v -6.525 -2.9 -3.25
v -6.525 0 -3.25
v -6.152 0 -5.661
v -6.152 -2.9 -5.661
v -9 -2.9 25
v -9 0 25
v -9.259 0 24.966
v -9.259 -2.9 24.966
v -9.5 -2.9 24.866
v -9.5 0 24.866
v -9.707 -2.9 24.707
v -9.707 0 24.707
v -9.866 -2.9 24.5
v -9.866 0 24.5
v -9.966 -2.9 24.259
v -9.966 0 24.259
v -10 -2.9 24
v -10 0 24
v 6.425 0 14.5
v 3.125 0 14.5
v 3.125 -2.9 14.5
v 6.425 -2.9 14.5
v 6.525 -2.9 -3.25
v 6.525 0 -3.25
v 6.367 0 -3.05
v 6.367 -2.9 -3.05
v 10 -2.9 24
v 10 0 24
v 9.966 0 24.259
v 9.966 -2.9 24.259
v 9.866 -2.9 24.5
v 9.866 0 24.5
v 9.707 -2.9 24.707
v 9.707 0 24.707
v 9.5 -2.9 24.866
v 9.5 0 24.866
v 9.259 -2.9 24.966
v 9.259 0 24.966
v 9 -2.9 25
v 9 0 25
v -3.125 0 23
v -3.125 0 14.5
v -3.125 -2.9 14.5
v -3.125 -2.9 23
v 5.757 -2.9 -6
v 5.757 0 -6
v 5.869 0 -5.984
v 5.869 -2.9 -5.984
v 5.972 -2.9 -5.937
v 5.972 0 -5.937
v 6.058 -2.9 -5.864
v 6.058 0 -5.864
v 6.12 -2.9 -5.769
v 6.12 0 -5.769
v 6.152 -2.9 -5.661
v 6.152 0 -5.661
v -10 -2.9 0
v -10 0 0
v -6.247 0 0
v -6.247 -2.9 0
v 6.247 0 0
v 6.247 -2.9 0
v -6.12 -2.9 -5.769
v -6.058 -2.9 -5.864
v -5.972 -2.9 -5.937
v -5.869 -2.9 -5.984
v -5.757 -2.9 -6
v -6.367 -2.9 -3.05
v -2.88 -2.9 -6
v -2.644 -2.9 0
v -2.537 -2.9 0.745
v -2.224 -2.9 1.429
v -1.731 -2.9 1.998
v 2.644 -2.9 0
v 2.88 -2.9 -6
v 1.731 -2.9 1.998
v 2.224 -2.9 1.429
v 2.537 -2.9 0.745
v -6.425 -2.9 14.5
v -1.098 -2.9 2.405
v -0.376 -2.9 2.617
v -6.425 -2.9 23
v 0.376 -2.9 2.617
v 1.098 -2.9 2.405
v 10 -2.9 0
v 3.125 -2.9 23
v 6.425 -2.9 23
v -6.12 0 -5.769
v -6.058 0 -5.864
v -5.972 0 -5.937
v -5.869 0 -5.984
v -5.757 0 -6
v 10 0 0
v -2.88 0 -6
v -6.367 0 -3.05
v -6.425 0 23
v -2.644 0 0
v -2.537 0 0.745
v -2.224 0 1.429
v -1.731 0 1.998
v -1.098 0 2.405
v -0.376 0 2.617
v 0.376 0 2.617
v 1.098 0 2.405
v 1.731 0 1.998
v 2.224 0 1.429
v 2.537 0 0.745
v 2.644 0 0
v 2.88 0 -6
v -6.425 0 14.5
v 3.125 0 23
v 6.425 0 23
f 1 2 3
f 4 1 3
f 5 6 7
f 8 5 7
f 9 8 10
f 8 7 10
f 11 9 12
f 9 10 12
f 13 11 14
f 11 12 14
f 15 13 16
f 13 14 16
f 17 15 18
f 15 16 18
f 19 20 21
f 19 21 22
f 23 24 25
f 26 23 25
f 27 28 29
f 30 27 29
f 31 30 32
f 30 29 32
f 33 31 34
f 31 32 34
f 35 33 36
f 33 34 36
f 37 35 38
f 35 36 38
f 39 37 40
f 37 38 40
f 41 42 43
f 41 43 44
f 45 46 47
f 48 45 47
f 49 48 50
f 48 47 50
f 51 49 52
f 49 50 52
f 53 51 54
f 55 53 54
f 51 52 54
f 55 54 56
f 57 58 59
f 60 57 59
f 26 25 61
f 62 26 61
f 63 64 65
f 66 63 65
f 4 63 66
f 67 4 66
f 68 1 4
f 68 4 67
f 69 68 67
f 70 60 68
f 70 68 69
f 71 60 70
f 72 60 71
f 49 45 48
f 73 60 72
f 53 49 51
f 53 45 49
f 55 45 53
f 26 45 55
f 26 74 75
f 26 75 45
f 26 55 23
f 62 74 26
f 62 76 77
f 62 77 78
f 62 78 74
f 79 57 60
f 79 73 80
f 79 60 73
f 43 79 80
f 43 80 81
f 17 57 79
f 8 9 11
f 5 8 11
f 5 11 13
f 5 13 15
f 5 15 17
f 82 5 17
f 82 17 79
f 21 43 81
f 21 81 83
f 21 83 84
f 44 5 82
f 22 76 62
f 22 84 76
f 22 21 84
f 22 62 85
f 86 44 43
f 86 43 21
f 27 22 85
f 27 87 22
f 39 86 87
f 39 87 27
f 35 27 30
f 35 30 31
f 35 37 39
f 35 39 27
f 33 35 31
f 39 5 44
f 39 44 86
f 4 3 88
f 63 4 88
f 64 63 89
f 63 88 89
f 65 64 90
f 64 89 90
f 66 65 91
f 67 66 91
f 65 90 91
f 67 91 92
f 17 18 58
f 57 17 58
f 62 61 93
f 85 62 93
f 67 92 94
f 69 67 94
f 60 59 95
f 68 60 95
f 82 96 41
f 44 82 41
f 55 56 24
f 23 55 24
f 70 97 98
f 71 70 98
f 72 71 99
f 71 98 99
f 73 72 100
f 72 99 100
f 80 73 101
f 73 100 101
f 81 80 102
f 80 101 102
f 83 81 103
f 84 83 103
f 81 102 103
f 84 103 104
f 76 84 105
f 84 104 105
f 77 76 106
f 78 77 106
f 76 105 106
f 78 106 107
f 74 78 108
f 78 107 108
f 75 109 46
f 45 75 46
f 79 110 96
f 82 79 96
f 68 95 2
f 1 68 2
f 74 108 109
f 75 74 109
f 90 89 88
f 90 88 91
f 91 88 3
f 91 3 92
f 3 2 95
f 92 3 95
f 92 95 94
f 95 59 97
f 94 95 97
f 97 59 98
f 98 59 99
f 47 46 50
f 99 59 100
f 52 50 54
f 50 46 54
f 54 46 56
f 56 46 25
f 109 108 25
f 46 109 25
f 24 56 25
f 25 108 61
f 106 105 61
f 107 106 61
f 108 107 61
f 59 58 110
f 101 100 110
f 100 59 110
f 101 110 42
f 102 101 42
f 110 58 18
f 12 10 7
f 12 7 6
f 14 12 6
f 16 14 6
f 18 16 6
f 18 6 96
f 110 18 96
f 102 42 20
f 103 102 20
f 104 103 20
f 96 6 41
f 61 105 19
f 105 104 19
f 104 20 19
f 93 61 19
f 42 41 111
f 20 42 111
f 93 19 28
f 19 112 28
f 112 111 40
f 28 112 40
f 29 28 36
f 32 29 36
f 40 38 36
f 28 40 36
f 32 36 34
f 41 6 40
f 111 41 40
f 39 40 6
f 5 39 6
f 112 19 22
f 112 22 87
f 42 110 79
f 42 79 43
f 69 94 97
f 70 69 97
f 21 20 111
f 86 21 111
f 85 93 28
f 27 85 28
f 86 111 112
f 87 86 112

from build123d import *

# Parameters (mm, degrees)
F0_W     = 3.3
F0_H     = 8.5
F1_DEPTH = 2.9


with BuildPart() as f1:
    # F0 (on Front) → F1 (new body)
    with BuildSketch(Plane.XZ):
        with BuildLine():
            Line((-10, 24), (-10, 0))
            Line((-10, 0), (-6.246776, 0))
            Line((-6.246776, 0), (-6.367, -3.05))
            Line((-6.367, -3.05), (-6.525, -3.25))
            Line((-6.525, -3.25), (-6.152377, -5.661093))
            ThreePointArc((-6.152377, -5.661093), (-6.017418, -5.903675), (-5.75707, -6))
            Line((-5.75707, -6), (-2.880486, -6))
            Line((-2.880486, -6), (-2.643981, 0))
            ThreePointArc((-2.643981, 0), (0, 2.643981), (2.643981, 0))
            Line((2.643981, 0), (2.880486, -6))
            Line((2.880486, -6), (5.75707, -6))
            ThreePointArc((5.75707, -6), (6.017418, -5.903675), (6.152377, -5.661093))
            Line((6.152377, -5.661093), (6.525, -3.25))
            Line((6.525, -3.25), (6.367, -3.05))
            Line((6.367, -3.05), (6.246776, 0))
            Line((6.246776, 0), (10, 0))
            Line((10, 0), (10, 24))
            ThreePointArc((10, 24), (9.707107, 24.707107), (9, 25))
            Line((9, 25), (-9, 25))
            ThreePointArc((-9, 25), (-9.707107, 24.707107), (-10, 24))
        make_face()
        with Locations((-4.775, 18.75)):
            Rectangle(F0_W, F0_H, mode=Mode.SUBTRACT)
        with Locations((4.775, 18.75)):
            Rectangle(F0_W, F0_H, mode=Mode.SUBTRACT)
    extrude(amount=F1_DEPTH)


solid = f1.part
